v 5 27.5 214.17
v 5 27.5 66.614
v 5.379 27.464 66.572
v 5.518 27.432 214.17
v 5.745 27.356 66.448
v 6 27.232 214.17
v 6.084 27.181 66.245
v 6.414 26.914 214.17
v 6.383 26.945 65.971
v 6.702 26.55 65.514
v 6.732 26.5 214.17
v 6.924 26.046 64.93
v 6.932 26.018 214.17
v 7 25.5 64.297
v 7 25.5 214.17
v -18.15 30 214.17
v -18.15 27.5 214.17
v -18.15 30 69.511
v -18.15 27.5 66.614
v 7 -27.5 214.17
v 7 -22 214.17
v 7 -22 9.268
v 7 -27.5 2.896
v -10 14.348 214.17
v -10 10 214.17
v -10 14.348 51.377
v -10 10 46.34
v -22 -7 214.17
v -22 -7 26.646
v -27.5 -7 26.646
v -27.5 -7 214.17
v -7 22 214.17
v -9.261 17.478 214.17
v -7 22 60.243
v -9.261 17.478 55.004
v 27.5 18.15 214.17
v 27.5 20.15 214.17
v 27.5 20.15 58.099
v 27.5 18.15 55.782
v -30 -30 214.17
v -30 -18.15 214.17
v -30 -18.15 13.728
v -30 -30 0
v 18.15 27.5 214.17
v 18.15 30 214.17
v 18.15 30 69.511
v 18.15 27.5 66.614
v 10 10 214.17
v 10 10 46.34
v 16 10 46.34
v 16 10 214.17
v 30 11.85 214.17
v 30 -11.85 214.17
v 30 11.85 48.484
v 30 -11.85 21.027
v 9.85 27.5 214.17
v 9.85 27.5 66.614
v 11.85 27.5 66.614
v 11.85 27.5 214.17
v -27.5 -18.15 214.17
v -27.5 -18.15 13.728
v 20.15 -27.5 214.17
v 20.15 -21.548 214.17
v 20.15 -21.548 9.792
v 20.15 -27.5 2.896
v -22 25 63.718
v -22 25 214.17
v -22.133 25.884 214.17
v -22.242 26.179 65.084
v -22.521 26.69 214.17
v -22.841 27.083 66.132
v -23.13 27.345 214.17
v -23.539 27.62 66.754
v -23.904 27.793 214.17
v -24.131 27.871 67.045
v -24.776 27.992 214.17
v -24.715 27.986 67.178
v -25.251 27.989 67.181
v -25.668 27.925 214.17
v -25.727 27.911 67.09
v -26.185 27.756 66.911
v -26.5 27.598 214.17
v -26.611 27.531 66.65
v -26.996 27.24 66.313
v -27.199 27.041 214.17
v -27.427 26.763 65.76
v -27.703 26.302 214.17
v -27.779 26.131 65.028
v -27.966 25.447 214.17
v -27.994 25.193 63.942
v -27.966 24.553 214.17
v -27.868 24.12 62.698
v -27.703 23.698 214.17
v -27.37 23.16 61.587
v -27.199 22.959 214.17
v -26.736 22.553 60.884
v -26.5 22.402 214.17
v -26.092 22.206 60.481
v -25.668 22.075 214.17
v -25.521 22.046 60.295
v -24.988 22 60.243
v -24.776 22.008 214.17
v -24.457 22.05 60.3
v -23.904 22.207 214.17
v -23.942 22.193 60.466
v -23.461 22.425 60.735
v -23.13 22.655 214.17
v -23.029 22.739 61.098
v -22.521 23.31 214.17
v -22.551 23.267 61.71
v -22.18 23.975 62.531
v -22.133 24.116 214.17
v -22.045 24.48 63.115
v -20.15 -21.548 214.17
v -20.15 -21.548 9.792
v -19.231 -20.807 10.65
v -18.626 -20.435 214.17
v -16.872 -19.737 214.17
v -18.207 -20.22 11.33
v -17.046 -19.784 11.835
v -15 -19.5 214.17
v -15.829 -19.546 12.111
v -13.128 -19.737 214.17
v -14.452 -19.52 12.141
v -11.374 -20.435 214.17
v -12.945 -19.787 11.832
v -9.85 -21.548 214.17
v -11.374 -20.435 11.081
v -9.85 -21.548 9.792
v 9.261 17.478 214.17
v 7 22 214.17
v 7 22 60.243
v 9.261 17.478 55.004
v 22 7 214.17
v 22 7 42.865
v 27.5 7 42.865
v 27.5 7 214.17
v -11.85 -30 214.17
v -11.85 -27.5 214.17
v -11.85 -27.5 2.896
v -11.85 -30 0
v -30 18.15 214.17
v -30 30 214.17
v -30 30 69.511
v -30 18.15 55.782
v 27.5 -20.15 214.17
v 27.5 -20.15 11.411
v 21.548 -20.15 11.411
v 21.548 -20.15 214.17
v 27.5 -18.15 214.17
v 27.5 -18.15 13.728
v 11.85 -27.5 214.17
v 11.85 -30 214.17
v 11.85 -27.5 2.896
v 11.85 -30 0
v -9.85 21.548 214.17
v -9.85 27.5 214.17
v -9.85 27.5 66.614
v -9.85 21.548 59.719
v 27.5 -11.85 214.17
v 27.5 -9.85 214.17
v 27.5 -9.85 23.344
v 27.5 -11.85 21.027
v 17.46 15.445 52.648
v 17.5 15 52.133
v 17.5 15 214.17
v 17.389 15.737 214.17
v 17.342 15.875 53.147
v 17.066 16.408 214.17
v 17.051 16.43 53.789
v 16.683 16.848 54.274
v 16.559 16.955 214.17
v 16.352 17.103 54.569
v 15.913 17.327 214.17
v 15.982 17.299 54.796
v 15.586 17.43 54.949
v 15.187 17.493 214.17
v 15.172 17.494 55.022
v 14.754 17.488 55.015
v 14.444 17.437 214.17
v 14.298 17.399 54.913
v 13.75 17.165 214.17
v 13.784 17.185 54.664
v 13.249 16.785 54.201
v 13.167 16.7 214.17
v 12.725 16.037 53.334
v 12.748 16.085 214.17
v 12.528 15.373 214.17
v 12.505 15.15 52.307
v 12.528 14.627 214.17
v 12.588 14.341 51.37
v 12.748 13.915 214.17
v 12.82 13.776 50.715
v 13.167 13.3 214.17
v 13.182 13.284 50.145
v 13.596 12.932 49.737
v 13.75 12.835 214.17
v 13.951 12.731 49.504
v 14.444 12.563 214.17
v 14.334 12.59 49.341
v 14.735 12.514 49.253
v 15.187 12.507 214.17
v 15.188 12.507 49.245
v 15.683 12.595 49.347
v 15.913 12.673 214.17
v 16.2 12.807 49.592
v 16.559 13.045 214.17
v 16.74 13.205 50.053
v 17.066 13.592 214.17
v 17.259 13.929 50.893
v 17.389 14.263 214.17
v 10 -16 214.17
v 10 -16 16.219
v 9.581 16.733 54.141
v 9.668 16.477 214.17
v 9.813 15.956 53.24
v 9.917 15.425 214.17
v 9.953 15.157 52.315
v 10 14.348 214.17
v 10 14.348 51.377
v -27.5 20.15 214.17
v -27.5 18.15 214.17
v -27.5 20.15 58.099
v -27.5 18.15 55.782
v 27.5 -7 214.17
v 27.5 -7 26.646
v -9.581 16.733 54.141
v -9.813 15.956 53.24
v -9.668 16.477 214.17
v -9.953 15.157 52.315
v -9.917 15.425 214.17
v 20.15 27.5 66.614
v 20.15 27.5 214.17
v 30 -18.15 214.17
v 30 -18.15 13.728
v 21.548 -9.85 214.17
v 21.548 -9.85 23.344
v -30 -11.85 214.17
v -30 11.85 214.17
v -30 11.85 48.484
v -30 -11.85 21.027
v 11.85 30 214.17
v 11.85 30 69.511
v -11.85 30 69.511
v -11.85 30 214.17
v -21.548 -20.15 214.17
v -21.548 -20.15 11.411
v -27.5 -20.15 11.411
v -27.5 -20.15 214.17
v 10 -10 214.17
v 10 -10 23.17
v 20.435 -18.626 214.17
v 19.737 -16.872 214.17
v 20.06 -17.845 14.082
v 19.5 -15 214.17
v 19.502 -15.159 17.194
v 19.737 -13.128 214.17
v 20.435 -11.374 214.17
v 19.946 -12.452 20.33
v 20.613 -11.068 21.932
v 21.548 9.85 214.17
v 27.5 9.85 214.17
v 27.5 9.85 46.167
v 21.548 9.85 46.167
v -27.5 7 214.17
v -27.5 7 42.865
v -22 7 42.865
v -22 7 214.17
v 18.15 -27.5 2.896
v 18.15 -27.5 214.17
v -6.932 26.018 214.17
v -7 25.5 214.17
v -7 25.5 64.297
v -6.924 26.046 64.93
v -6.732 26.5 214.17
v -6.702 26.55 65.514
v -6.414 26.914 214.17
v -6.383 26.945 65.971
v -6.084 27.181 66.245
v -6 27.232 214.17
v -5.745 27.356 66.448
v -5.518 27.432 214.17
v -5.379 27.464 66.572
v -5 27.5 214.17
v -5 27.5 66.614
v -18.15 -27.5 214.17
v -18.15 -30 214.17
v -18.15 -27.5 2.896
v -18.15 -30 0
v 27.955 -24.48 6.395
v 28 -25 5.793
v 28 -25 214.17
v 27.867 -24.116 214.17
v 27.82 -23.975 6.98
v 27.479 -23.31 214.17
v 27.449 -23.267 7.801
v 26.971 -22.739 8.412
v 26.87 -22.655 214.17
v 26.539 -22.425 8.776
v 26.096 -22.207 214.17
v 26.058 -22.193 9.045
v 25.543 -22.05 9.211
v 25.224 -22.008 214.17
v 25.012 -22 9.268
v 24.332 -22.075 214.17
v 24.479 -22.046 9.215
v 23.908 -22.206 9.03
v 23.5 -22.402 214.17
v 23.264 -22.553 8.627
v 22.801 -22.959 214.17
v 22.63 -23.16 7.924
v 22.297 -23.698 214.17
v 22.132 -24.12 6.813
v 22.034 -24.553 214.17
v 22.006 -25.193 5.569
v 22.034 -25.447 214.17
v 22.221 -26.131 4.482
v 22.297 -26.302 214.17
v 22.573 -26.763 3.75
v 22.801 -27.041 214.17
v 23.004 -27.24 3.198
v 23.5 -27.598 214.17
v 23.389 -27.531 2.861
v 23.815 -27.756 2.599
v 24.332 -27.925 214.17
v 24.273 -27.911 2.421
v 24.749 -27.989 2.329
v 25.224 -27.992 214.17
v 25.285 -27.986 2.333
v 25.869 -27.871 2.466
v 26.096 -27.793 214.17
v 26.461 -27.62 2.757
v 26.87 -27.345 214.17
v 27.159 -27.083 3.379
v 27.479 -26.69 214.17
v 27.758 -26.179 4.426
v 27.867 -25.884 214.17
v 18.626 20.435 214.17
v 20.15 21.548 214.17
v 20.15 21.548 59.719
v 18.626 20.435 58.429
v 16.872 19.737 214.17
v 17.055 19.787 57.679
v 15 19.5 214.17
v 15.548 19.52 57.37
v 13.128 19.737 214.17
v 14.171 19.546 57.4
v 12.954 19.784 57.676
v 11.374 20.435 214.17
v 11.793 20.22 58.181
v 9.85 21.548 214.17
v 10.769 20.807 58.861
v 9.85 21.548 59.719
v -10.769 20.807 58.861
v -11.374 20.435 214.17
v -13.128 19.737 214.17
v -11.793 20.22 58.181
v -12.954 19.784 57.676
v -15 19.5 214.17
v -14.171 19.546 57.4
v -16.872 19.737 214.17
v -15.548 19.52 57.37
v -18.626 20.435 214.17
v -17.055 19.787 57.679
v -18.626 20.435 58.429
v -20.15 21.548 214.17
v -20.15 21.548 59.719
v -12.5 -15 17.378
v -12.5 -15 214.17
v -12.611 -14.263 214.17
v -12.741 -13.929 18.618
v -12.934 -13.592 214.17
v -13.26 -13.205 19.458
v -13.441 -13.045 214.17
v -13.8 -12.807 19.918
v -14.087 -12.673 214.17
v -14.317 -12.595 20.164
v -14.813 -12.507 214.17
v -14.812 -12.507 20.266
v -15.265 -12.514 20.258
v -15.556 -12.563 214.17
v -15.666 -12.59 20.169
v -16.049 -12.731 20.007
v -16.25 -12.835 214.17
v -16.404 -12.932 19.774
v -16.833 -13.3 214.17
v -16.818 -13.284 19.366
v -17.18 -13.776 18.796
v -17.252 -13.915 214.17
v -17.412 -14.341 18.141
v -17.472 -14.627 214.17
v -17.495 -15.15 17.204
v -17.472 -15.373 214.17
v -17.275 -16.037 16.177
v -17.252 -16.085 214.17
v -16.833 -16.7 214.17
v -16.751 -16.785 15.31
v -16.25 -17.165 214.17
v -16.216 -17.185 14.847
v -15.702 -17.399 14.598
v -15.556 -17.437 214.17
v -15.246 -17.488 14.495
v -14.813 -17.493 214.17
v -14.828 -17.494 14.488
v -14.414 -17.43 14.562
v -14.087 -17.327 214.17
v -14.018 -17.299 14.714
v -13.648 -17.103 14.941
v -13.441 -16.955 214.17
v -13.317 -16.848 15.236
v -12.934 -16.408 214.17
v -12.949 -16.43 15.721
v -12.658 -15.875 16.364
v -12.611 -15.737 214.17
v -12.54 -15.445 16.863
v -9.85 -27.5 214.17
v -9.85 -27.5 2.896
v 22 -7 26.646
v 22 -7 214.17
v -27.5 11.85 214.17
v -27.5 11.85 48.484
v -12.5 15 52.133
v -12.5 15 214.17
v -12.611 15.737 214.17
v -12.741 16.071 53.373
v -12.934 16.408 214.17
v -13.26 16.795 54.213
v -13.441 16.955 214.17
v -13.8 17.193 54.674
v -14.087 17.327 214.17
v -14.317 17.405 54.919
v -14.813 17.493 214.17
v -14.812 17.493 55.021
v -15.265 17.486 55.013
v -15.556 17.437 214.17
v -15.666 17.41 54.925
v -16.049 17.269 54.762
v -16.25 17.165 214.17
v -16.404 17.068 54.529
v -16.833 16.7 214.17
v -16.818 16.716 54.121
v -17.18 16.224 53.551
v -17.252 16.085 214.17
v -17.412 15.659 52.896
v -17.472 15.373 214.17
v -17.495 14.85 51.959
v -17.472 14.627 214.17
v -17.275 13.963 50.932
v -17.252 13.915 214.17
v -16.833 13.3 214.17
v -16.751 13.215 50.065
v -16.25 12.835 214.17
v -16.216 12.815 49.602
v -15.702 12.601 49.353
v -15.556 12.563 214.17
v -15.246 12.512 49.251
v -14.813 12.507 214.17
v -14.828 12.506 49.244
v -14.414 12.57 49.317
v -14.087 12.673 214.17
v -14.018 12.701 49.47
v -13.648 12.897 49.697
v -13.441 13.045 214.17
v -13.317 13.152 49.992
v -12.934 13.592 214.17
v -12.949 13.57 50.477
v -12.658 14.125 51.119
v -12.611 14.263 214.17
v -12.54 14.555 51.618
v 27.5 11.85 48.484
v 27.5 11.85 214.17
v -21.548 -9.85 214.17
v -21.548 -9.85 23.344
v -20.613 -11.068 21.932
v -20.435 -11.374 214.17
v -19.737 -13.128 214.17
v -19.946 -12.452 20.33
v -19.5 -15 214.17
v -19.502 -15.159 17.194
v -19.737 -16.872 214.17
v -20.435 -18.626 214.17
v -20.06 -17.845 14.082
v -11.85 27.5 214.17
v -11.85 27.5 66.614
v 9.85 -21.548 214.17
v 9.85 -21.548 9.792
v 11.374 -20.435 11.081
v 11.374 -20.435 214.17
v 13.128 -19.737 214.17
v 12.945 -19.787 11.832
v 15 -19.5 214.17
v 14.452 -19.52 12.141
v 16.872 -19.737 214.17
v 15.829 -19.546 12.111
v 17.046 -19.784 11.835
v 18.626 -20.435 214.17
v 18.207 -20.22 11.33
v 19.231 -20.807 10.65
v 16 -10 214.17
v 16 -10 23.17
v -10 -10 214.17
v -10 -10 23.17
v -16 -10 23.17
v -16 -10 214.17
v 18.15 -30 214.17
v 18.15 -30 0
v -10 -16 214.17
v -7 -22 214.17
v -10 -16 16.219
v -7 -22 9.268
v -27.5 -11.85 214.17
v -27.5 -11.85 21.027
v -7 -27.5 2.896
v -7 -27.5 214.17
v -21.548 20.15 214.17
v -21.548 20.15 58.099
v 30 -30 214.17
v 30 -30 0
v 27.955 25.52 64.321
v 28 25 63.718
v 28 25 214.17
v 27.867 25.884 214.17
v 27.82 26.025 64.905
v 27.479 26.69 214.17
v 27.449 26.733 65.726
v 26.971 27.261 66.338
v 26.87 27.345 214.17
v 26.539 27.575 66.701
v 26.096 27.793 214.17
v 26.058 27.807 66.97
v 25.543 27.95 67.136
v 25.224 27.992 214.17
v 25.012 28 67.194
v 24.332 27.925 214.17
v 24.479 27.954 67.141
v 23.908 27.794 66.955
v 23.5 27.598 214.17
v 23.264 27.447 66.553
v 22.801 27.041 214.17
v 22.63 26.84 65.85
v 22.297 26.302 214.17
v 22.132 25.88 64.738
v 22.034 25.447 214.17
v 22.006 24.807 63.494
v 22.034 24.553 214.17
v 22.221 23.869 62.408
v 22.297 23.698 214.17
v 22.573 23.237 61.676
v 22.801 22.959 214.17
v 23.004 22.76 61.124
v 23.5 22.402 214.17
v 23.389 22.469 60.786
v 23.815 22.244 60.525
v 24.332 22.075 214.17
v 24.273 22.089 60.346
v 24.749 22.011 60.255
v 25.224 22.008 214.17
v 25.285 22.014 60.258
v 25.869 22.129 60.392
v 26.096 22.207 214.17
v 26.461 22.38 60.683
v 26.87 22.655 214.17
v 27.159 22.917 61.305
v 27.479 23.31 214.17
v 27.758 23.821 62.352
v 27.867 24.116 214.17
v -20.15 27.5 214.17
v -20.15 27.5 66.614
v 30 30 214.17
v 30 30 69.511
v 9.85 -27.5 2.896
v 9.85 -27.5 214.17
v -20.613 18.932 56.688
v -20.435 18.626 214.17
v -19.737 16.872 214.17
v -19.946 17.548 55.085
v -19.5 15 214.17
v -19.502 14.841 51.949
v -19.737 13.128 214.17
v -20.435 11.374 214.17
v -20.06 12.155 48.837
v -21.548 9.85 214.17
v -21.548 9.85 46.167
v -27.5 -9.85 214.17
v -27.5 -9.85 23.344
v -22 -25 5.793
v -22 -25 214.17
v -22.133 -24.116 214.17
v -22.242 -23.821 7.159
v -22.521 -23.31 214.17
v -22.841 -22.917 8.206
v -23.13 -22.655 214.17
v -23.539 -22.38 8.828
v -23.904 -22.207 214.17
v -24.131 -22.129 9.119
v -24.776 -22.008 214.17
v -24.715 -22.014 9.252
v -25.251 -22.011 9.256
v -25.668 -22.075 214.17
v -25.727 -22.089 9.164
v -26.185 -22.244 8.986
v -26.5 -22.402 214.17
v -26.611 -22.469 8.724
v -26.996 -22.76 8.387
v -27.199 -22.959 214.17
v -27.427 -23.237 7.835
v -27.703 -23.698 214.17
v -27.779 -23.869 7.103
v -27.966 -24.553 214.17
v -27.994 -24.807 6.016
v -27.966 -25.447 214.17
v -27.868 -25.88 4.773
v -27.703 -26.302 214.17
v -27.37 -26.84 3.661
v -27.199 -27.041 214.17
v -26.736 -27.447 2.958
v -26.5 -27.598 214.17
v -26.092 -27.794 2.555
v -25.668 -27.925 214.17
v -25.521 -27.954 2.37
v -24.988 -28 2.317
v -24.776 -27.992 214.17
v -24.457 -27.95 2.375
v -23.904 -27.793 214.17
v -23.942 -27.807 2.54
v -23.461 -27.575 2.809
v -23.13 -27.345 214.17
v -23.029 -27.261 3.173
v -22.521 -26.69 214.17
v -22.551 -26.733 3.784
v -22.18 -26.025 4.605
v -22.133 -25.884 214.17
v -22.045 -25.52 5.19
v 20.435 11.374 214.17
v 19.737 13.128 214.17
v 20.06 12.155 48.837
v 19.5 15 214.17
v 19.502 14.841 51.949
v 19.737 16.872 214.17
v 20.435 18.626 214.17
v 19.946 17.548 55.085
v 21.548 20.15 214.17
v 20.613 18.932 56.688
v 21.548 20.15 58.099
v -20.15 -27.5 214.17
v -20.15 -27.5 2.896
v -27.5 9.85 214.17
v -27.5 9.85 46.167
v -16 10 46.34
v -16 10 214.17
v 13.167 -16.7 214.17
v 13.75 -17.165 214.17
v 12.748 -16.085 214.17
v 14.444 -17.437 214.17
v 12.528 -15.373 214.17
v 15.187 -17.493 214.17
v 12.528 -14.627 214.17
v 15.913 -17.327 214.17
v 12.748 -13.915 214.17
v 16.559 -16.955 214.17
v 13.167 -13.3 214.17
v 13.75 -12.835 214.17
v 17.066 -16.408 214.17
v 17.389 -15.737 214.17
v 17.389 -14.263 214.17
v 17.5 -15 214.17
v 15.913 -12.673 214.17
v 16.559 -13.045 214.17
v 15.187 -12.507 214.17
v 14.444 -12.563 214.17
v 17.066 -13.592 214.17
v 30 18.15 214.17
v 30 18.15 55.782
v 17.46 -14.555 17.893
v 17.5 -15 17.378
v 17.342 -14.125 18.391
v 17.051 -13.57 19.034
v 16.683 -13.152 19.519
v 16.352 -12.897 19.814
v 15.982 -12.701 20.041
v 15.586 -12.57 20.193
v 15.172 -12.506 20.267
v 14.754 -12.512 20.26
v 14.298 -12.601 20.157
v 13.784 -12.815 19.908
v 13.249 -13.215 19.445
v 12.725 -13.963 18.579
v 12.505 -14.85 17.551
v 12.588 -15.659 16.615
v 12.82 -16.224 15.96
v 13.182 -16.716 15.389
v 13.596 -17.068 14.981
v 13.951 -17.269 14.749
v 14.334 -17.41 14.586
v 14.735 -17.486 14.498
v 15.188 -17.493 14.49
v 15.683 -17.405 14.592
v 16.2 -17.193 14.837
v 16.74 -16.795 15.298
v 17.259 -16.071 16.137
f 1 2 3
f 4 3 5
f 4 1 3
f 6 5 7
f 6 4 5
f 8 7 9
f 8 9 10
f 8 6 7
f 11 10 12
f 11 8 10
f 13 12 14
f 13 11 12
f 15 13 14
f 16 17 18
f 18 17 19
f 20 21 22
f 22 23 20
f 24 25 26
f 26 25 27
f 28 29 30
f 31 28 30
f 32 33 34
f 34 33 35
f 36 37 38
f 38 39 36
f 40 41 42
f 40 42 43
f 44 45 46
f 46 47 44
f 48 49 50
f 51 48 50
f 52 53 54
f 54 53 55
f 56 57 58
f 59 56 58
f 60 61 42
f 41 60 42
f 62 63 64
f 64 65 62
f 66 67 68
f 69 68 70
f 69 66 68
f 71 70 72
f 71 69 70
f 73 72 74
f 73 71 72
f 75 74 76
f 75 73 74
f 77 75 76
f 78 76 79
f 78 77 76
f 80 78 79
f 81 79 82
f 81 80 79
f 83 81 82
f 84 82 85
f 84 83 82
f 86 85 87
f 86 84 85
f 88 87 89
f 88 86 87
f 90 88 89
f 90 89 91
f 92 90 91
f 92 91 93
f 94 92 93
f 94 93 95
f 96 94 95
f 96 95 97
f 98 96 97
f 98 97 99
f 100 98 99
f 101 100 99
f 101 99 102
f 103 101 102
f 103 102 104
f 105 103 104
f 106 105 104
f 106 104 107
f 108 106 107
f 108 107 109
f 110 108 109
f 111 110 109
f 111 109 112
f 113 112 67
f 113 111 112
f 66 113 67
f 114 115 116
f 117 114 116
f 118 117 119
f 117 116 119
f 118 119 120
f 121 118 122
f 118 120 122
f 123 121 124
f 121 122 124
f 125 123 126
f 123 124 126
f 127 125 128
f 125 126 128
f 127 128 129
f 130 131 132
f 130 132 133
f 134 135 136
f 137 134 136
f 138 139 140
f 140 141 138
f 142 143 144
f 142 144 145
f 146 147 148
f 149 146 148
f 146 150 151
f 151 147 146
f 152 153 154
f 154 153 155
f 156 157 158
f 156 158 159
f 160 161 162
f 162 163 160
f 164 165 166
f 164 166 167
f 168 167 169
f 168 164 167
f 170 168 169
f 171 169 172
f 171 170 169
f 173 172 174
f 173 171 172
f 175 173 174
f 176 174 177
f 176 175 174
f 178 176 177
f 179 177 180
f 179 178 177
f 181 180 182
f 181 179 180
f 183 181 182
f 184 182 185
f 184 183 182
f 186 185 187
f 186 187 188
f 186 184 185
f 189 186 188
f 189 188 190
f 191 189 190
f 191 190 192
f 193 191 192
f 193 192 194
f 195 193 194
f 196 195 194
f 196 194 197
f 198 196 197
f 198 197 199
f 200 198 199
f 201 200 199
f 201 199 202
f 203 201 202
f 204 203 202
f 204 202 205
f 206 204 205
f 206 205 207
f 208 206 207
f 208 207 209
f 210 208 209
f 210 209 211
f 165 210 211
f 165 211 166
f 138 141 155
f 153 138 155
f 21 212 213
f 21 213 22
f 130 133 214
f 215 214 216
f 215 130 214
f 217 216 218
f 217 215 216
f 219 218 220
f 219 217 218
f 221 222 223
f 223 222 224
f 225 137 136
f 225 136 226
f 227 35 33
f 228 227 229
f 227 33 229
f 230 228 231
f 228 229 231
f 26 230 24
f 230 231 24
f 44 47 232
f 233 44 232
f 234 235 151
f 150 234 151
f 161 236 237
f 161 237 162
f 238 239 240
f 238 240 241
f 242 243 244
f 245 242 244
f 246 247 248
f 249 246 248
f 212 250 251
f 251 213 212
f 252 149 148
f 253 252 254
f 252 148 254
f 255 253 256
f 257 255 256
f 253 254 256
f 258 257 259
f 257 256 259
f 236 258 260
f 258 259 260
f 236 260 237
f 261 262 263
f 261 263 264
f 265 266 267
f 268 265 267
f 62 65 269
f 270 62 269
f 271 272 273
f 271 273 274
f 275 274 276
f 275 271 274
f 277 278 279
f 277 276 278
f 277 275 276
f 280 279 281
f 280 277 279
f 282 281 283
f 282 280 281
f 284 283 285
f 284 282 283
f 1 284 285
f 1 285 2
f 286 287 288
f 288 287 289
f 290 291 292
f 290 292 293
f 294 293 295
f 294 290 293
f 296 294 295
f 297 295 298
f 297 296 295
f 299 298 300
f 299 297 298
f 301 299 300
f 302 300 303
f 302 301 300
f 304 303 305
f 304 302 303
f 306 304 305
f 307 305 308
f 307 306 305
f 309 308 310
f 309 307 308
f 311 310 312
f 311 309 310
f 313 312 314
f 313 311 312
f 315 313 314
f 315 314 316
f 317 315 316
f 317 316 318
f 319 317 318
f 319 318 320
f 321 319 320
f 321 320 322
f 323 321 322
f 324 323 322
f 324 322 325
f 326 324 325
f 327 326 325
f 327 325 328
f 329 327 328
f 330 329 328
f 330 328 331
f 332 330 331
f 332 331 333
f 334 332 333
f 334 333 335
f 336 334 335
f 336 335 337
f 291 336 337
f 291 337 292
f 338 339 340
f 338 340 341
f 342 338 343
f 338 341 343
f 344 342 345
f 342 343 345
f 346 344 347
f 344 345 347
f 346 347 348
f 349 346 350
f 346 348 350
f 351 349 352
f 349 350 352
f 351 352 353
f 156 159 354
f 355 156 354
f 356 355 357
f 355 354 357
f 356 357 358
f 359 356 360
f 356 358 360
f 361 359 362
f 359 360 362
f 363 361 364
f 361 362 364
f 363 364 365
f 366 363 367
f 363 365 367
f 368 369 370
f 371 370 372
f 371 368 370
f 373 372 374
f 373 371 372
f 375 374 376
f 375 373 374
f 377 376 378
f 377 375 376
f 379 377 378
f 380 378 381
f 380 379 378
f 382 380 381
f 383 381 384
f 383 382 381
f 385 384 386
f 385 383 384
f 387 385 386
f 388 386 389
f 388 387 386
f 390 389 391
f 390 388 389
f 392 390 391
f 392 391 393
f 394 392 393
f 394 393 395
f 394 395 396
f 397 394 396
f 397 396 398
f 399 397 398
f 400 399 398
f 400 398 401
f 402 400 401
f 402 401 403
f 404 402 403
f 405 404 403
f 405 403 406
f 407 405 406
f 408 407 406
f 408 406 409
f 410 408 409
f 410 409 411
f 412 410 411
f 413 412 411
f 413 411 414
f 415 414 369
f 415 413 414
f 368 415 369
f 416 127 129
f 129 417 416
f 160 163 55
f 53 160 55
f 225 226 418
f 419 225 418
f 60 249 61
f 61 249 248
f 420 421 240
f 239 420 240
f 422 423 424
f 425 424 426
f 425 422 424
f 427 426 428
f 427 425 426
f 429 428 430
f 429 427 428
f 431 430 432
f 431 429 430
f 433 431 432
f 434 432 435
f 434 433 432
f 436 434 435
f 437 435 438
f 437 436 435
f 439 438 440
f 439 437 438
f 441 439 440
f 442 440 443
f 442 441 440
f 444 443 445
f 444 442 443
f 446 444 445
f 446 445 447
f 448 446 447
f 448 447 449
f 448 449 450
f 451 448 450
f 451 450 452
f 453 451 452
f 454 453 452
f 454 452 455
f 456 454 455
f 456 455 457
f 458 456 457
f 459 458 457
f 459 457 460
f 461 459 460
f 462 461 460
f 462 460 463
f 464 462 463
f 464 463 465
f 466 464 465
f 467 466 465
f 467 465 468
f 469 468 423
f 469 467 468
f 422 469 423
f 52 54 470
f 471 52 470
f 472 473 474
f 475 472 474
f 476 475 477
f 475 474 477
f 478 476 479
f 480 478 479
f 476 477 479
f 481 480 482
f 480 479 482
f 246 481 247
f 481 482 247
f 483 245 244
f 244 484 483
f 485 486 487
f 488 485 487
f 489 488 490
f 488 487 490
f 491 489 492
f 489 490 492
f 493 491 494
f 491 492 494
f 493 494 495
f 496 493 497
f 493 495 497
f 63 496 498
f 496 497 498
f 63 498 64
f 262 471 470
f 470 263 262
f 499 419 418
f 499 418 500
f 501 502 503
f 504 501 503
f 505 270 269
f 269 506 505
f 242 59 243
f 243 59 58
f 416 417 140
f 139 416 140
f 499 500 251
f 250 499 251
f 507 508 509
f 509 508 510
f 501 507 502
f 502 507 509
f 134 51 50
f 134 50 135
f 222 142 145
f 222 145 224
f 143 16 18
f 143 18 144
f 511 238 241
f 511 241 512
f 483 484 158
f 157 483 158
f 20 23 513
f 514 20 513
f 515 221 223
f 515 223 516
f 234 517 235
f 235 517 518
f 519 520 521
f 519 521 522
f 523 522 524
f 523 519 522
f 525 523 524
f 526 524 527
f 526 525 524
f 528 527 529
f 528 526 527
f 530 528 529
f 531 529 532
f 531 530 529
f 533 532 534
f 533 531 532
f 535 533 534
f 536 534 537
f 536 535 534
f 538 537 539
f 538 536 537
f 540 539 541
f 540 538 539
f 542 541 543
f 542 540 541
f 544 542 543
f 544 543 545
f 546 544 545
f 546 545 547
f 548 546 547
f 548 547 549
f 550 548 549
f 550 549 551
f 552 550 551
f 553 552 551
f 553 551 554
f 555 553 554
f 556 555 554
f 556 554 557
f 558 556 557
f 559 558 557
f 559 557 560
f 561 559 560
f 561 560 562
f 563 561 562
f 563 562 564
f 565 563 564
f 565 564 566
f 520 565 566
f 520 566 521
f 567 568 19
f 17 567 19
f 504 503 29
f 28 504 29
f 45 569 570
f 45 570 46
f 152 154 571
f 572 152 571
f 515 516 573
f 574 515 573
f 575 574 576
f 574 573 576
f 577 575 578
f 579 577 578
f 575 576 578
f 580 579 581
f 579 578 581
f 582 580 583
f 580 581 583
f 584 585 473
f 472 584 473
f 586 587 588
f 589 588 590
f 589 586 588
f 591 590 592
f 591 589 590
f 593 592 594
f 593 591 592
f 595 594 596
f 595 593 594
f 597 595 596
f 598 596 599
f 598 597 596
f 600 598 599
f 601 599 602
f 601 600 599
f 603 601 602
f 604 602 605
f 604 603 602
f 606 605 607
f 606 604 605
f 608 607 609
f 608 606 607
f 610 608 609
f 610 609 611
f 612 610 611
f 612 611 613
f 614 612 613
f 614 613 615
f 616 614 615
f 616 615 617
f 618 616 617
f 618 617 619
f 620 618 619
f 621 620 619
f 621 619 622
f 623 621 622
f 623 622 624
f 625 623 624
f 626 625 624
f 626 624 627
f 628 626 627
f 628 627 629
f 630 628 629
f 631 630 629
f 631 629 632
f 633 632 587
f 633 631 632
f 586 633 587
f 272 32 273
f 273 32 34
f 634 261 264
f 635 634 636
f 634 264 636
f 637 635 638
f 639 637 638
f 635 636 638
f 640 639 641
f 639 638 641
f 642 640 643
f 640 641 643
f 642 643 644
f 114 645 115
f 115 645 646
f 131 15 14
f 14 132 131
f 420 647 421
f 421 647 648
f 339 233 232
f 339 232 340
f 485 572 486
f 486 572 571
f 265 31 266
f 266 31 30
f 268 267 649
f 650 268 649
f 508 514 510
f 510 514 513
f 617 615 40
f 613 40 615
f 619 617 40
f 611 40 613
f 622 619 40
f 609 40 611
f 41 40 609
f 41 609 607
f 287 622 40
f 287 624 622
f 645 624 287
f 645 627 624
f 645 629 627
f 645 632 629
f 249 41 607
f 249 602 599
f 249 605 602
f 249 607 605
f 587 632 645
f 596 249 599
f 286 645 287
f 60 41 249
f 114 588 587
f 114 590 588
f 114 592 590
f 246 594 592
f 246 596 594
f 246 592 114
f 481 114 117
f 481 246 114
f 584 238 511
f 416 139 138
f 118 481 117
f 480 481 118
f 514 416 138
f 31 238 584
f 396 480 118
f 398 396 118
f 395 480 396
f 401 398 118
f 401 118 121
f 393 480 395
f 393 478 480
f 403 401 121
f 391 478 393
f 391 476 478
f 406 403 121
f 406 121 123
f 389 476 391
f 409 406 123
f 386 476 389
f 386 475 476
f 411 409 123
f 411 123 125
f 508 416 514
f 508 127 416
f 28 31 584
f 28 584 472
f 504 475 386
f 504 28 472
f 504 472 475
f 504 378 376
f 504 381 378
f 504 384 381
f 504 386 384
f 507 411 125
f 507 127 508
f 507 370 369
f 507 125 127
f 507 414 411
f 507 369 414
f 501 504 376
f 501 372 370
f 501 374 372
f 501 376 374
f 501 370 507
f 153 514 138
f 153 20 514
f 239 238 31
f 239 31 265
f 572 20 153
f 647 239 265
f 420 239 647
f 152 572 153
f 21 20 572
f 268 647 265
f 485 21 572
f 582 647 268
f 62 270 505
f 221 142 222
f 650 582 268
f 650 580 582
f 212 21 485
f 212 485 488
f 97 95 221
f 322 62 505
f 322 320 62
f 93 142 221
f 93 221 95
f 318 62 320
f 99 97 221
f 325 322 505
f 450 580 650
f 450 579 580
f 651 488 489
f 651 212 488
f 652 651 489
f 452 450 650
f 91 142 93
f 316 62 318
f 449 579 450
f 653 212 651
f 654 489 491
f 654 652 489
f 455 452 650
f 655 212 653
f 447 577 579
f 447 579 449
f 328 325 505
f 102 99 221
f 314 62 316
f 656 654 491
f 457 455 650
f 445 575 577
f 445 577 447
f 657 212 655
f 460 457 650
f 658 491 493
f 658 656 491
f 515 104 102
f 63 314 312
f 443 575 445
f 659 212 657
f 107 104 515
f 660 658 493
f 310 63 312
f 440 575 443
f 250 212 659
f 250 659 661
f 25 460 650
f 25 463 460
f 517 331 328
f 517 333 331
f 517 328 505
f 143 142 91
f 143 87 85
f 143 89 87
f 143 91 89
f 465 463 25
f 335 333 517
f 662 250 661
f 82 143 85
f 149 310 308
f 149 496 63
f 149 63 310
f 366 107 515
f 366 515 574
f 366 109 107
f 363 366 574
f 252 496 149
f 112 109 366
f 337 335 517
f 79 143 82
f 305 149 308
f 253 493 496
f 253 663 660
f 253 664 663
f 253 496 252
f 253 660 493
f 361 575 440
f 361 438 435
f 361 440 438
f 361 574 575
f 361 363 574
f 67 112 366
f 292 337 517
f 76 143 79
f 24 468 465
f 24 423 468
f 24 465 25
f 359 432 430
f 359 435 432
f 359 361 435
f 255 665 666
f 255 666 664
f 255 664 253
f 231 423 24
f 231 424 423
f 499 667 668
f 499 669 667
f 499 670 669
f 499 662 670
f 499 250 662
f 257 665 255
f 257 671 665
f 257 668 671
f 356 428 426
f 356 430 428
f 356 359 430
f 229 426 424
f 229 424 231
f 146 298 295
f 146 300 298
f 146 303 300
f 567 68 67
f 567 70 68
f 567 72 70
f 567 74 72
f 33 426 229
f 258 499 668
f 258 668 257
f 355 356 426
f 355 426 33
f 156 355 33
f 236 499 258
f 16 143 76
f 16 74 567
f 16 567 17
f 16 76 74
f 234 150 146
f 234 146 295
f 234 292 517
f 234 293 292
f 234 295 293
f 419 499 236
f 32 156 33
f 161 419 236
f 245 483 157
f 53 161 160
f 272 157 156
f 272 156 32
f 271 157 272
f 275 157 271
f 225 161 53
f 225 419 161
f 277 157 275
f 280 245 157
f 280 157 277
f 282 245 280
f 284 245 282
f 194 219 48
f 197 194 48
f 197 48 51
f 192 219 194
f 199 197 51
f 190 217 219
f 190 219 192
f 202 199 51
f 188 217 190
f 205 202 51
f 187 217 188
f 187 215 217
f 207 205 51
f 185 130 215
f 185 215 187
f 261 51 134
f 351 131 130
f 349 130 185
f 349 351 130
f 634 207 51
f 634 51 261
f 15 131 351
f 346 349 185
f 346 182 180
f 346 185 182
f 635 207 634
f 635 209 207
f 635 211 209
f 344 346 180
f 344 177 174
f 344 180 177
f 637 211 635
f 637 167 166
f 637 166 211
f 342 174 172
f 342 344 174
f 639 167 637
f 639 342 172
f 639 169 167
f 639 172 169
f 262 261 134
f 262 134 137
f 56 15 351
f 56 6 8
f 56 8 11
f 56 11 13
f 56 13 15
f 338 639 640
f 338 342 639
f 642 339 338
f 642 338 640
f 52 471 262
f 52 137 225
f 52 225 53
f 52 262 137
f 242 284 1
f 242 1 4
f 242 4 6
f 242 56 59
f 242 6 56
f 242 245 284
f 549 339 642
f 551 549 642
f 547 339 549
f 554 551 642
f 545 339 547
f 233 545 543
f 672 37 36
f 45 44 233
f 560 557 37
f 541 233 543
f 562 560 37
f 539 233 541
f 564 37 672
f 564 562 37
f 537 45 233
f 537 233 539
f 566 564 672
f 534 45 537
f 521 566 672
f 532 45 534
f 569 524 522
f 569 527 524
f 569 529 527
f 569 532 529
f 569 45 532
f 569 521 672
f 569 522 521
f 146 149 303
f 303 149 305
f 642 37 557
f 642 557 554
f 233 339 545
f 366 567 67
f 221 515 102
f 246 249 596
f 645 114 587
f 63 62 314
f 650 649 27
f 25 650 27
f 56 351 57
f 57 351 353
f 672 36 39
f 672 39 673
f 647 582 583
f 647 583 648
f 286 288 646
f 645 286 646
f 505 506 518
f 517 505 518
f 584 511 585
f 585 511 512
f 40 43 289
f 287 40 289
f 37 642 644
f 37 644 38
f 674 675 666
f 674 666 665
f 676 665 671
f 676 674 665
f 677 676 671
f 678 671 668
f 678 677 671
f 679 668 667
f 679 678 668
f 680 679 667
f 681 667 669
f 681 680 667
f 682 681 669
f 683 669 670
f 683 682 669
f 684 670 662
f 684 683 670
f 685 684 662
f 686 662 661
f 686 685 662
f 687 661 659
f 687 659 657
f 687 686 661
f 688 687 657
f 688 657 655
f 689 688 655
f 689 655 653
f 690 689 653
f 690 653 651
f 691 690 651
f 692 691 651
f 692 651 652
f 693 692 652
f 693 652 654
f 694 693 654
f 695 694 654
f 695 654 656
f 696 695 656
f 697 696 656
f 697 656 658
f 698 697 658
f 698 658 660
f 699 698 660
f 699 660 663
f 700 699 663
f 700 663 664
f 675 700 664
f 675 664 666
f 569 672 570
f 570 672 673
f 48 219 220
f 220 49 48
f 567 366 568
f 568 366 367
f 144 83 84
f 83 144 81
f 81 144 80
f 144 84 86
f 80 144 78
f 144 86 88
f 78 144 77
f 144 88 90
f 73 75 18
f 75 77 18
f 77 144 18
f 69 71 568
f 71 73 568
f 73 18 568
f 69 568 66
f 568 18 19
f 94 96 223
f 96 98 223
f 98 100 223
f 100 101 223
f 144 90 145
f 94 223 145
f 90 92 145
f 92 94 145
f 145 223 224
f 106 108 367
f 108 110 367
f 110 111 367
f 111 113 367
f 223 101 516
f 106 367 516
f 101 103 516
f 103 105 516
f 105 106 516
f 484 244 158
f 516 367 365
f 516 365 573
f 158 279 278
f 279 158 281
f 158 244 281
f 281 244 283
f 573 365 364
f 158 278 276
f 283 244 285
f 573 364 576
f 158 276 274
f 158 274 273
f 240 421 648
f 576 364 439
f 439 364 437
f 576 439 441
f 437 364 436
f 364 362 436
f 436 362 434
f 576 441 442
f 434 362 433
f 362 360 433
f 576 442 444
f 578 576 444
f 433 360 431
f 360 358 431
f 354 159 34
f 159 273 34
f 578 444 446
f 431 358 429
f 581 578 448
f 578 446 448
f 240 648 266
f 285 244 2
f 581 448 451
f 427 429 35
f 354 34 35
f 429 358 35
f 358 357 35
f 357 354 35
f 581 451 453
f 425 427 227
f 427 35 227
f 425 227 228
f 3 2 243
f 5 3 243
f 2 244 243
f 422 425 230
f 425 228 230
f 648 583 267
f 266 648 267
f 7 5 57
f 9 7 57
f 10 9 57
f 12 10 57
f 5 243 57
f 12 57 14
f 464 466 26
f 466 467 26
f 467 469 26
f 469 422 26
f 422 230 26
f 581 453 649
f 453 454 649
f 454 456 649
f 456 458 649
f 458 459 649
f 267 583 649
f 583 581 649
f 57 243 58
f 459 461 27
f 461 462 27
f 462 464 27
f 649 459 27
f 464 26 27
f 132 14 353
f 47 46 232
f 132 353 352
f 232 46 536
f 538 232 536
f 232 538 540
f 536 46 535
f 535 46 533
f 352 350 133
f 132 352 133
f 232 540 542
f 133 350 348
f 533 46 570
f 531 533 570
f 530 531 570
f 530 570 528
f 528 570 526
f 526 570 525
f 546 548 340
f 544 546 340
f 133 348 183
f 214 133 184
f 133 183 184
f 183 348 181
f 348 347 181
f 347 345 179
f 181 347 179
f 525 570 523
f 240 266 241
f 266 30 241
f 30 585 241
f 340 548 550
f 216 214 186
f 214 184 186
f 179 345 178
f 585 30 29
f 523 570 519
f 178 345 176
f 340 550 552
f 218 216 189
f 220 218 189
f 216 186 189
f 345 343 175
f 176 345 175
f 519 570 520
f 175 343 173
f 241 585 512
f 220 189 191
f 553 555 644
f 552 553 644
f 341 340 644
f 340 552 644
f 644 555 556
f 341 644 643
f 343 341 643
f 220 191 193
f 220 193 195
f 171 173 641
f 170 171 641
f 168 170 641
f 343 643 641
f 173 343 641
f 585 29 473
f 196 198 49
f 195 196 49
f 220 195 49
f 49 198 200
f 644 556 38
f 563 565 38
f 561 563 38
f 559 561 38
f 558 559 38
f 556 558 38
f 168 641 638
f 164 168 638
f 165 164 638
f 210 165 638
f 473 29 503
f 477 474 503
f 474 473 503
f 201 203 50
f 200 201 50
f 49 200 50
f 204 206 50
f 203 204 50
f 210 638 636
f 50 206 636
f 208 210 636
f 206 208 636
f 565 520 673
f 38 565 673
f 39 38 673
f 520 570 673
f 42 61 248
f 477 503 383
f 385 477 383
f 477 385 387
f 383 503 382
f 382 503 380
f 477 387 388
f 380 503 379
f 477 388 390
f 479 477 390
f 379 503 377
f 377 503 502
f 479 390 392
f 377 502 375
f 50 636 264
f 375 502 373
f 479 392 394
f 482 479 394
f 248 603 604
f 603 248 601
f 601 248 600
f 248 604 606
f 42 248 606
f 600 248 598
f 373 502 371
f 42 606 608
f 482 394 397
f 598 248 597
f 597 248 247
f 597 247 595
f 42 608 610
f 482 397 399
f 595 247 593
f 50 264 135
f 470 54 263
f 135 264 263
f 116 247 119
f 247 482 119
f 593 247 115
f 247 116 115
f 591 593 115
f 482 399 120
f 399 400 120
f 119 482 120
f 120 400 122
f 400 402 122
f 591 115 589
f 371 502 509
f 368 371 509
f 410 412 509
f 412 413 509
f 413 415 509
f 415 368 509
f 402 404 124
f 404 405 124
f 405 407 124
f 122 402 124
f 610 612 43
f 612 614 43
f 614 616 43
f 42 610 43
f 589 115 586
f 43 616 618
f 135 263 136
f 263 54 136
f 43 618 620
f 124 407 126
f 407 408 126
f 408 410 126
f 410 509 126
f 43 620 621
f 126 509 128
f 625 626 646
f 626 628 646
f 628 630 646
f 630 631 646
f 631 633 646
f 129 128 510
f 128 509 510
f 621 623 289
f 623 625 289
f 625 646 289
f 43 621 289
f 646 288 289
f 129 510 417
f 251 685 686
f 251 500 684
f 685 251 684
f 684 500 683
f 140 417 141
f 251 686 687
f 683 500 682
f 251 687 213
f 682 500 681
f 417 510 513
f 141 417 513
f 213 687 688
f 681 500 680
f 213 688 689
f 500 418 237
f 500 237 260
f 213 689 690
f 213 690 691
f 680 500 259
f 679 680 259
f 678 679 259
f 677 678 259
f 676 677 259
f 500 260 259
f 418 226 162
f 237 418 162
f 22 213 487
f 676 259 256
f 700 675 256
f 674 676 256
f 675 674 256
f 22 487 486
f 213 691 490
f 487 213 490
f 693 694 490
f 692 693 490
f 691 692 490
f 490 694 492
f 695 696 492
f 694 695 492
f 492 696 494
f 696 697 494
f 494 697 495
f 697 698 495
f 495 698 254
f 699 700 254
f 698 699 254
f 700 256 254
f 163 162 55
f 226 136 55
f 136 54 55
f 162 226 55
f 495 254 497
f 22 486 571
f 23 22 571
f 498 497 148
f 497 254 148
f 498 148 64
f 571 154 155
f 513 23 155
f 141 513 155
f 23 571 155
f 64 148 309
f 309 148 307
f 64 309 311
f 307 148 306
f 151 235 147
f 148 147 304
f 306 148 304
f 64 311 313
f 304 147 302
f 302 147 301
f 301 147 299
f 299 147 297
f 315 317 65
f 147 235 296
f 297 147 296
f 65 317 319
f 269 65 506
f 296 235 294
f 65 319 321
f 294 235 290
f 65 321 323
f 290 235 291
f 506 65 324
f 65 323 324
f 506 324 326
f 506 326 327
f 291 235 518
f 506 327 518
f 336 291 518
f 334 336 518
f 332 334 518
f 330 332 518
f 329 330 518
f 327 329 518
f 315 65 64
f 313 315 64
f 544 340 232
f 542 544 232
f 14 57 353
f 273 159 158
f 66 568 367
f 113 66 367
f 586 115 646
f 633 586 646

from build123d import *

# Parameters (mm, degrees)
F0_R          = 3
F0_R_2        = 2.5
F1_DEPTH      = 214.17
F2_R          = 2
F3_R          = 7
F5_DEPTH      = 30
F5_DEPTH_BACK = 30


# Not quite as in the source:
# - a feature names something its author has since deleted; it is built from what else it names


with BuildPart() as f1:
    # F0 (on Top) → F1 (new body)
    with BuildSketch(Plane.XY):
        with BuildLine():
            Line((18.15, -30), (30, -30))
            Line((30, -30), (30, -18.15))
            Line((30, -18.15), (27.5, -18.15))
            Line((27.5, -18.15), (27.5, -20.15))
            Line((27.5, -20.15), (21.5477069044, -20.15))
            ThreePointArc((21.5477069044, -20.15), (19.5, -15), (21.5477069044, -9.85))
            Line((21.5477069044, -9.85), (27.5, -9.85))
            Line((27.5, -9.85), (27.5, -11.85))
            Line((27.5, -11.85), (30, -11.85))
            Line((30, -11.85), (30, 11.85))
            Line((30, 11.85), (27.5, 11.85))
            Line((27.5, 11.85), (27.5, 9.85))
            Line((27.5, 9.85), (21.5477069044, 9.85))
            ThreePointArc((21.5477069044, 9.85), (19.5, 15), (21.5477069044, 20.15))
            Line((21.5477069044, 20.15), (27.5, 20.15))
            Line((27.5, 20.15), (27.5, 18.15))
            Line((27.5, 18.15), (30, 18.15))
            Line((30, 18.15), (30, 30))
            Line((30, 30), (18.15, 30))
            Line((18.15, 30), (18.15, 27.5))
            Line((18.15, 27.5), (20.15, 27.5))
            Line((20.15, 27.5), (20.15, 21.5477069044))
            ThreePointArc((20.15, 21.5477069044), (15, 19.5), (9.85, 21.5477069044))
            Line((9.85, 21.5477069044), (9.85, 27.5))
            Line((9.85, 27.5), (11.85, 27.5))
            Line((11.85, 27.5), (11.85, 30))
            Line((11.85, 30), (-11.85, 30))
            Line((-11.85, 30), (-11.85, 27.5))
            Line((-11.85, 27.5), (-9.85, 27.5))
            Line((-9.85, 27.5), (-9.85, 21.5477069044))
            ThreePointArc((-9.85, 21.5477069044), (-15, 19.5), (-20.15, 21.5477069044))
            Line((-20.15, 21.5477069044), (-20.15, 27.5))
            Line((-20.15, 27.5), (-18.15, 27.5))
            Line((-18.15, 27.5), (-18.15, 30))
            Line((-18.15, 30), (-30, 30))
            Line((-30, 30), (-30, 18.15))
            Line((-30, 18.15), (-27.5, 18.15))
            Line((-27.5, 18.15), (-27.5, 20.15))
            Line((-27.5, 20.15), (-21.5477069044, 20.15))
            ThreePointArc((-21.5477069044, 20.15), (-19.5, 15), (-21.5477069044, 9.85))
            Line((-21.5477069044, 9.85), (-27.5, 9.85))
            Line((-27.5, 9.85), (-27.5, 11.85))
            Line((-27.5, 11.85), (-30, 11.85))
            Line((-30, 11.85), (-30, -11.85))
            Line((-30, -11.85), (-27.5, -11.85))
            Line((-27.5, -11.85), (-27.5, -9.85))
            Line((-27.5, -9.85), (-21.5477069044, -9.85))
            ThreePointArc((-21.5477069044, -9.85), (-19.5, -15), (-21.5477069044, -20.15))
            Line((-21.5477069044, -20.15), (-27.5, -20.15))
            Line((-27.5, -20.15), (-27.5, -18.15))
            Line((-27.5, -18.15), (-30, -18.15))
            Line((-30, -18.15), (-30, -30))
            Line((-30, -30), (-18.15, -30))
            Line((-18.15, -30), (-18.15, -27.5))
            Line((-18.15, -27.5), (-20.15, -27.5))
            Line((-20.15, -27.5), (-20.15, -21.5477069044))
            ThreePointArc((-20.15, -21.5477069044), (-15, -19.5), (-9.85, -21.5477069044))
            Line((-9.85, -21.5477069044), (-9.85, -27.5))
            Line((-9.85, -27.5), (-11.85, -27.5))
            Line((-11.85, -27.5), (-11.85, -30))
            Line((-11.85, -30), (11.85, -30))
            Line((11.85, -30), (11.85, -27.5))
            Line((11.85, -27.5), (9.85, -27.5))
            Line((9.85, -27.5), (9.85, -21.5477069044))
            ThreePointArc((9.85, -21.5477069044), (15, -19.5), (20.15, -21.5477069044))
            Line((20.15, -21.5477069044), (20.15, -27.5))
            Line((20.15, -27.5), (18.15, -27.5))
            Line((18.15, -27.5), (18.15, -30))
        make_face()
        with Locations((-25, -25)):
            Circle(F0_R, mode=Mode.SUBTRACT)
        with Locations((-15, -15)):
            Circle(F0_R_2, mode=Mode.SUBTRACT)
        with Locations((25, -25)):
            Circle(F0_R, mode=Mode.SUBTRACT)
        with Locations((15, -15)):
            Circle(F0_R_2, mode=Mode.SUBTRACT)
        with Locations((-25, 25)):
            Circle(F0_R, mode=Mode.SUBTRACT)
        with Locations((-15, 15)):
            Circle(F0_R_2, mode=Mode.SUBTRACT)
        Polygon((-7, 22), (-7, 27.5), (0, 27.5), (7, 27.5), (7, 22), (10, 16), (10, 10), (16, 10), (22, 7), (27.5, 7), (27.5, 0), (27.5, -7), (22, -7), (16, -10), (10, -10), (10, -16), (7, -22), (7, -27.5), (0, -27.5), (-7, -27.5), (-7, -22), (-10, -16), (-10, -10), (-16, -10), (-22, -7), (-27.5, -7), (-27.5, 0), (-27.5, 7), (-22, 7), (-16, 10), (-10, 10), (-10, 16), align=None, mode=Mode.SUBTRACT)
        with Locations((15, 15)):
            Circle(F0_R_2, mode=Mode.SUBTRACT)
        with Locations((25, 25)):
            Circle(F0_R, mode=Mode.SUBTRACT)
    extrude(amount=F1_DEPTH)

    # F2
    f2_edges = [f1.edges().sort_by_distance(p)[0] for p in [
        (-7, 27.5, 107.085),
        (7, 27.5, 107.085),
    ]]
    fillet(f2_edges, radius=F2_R)

    # F3
    f3_edges = [f1.edges().sort_by_distance(p)[0] for p in [
        (-10, 16, 107.085),
        (10, 16, 107.085),
    ]]
    fillet(f3_edges, radius=F3_R)

    # F4 (on Right) → F5 (cut, two sides)
    with BuildSketch(Plane.YZ) as f5_sk:
        Polygon((71.6507620084, 117.7635412378), (-30, 0), (52.6850404625, -71.3718123739), (154.335802471, 46.3917288639), align=None)
    extrude(amount=F5_DEPTH, mode=Mode.SUBTRACT)
    extrude(f5_sk.sketch, amount=-F5_DEPTH_BACK, mode=Mode.SUBTRACT)


solid = f1.part
